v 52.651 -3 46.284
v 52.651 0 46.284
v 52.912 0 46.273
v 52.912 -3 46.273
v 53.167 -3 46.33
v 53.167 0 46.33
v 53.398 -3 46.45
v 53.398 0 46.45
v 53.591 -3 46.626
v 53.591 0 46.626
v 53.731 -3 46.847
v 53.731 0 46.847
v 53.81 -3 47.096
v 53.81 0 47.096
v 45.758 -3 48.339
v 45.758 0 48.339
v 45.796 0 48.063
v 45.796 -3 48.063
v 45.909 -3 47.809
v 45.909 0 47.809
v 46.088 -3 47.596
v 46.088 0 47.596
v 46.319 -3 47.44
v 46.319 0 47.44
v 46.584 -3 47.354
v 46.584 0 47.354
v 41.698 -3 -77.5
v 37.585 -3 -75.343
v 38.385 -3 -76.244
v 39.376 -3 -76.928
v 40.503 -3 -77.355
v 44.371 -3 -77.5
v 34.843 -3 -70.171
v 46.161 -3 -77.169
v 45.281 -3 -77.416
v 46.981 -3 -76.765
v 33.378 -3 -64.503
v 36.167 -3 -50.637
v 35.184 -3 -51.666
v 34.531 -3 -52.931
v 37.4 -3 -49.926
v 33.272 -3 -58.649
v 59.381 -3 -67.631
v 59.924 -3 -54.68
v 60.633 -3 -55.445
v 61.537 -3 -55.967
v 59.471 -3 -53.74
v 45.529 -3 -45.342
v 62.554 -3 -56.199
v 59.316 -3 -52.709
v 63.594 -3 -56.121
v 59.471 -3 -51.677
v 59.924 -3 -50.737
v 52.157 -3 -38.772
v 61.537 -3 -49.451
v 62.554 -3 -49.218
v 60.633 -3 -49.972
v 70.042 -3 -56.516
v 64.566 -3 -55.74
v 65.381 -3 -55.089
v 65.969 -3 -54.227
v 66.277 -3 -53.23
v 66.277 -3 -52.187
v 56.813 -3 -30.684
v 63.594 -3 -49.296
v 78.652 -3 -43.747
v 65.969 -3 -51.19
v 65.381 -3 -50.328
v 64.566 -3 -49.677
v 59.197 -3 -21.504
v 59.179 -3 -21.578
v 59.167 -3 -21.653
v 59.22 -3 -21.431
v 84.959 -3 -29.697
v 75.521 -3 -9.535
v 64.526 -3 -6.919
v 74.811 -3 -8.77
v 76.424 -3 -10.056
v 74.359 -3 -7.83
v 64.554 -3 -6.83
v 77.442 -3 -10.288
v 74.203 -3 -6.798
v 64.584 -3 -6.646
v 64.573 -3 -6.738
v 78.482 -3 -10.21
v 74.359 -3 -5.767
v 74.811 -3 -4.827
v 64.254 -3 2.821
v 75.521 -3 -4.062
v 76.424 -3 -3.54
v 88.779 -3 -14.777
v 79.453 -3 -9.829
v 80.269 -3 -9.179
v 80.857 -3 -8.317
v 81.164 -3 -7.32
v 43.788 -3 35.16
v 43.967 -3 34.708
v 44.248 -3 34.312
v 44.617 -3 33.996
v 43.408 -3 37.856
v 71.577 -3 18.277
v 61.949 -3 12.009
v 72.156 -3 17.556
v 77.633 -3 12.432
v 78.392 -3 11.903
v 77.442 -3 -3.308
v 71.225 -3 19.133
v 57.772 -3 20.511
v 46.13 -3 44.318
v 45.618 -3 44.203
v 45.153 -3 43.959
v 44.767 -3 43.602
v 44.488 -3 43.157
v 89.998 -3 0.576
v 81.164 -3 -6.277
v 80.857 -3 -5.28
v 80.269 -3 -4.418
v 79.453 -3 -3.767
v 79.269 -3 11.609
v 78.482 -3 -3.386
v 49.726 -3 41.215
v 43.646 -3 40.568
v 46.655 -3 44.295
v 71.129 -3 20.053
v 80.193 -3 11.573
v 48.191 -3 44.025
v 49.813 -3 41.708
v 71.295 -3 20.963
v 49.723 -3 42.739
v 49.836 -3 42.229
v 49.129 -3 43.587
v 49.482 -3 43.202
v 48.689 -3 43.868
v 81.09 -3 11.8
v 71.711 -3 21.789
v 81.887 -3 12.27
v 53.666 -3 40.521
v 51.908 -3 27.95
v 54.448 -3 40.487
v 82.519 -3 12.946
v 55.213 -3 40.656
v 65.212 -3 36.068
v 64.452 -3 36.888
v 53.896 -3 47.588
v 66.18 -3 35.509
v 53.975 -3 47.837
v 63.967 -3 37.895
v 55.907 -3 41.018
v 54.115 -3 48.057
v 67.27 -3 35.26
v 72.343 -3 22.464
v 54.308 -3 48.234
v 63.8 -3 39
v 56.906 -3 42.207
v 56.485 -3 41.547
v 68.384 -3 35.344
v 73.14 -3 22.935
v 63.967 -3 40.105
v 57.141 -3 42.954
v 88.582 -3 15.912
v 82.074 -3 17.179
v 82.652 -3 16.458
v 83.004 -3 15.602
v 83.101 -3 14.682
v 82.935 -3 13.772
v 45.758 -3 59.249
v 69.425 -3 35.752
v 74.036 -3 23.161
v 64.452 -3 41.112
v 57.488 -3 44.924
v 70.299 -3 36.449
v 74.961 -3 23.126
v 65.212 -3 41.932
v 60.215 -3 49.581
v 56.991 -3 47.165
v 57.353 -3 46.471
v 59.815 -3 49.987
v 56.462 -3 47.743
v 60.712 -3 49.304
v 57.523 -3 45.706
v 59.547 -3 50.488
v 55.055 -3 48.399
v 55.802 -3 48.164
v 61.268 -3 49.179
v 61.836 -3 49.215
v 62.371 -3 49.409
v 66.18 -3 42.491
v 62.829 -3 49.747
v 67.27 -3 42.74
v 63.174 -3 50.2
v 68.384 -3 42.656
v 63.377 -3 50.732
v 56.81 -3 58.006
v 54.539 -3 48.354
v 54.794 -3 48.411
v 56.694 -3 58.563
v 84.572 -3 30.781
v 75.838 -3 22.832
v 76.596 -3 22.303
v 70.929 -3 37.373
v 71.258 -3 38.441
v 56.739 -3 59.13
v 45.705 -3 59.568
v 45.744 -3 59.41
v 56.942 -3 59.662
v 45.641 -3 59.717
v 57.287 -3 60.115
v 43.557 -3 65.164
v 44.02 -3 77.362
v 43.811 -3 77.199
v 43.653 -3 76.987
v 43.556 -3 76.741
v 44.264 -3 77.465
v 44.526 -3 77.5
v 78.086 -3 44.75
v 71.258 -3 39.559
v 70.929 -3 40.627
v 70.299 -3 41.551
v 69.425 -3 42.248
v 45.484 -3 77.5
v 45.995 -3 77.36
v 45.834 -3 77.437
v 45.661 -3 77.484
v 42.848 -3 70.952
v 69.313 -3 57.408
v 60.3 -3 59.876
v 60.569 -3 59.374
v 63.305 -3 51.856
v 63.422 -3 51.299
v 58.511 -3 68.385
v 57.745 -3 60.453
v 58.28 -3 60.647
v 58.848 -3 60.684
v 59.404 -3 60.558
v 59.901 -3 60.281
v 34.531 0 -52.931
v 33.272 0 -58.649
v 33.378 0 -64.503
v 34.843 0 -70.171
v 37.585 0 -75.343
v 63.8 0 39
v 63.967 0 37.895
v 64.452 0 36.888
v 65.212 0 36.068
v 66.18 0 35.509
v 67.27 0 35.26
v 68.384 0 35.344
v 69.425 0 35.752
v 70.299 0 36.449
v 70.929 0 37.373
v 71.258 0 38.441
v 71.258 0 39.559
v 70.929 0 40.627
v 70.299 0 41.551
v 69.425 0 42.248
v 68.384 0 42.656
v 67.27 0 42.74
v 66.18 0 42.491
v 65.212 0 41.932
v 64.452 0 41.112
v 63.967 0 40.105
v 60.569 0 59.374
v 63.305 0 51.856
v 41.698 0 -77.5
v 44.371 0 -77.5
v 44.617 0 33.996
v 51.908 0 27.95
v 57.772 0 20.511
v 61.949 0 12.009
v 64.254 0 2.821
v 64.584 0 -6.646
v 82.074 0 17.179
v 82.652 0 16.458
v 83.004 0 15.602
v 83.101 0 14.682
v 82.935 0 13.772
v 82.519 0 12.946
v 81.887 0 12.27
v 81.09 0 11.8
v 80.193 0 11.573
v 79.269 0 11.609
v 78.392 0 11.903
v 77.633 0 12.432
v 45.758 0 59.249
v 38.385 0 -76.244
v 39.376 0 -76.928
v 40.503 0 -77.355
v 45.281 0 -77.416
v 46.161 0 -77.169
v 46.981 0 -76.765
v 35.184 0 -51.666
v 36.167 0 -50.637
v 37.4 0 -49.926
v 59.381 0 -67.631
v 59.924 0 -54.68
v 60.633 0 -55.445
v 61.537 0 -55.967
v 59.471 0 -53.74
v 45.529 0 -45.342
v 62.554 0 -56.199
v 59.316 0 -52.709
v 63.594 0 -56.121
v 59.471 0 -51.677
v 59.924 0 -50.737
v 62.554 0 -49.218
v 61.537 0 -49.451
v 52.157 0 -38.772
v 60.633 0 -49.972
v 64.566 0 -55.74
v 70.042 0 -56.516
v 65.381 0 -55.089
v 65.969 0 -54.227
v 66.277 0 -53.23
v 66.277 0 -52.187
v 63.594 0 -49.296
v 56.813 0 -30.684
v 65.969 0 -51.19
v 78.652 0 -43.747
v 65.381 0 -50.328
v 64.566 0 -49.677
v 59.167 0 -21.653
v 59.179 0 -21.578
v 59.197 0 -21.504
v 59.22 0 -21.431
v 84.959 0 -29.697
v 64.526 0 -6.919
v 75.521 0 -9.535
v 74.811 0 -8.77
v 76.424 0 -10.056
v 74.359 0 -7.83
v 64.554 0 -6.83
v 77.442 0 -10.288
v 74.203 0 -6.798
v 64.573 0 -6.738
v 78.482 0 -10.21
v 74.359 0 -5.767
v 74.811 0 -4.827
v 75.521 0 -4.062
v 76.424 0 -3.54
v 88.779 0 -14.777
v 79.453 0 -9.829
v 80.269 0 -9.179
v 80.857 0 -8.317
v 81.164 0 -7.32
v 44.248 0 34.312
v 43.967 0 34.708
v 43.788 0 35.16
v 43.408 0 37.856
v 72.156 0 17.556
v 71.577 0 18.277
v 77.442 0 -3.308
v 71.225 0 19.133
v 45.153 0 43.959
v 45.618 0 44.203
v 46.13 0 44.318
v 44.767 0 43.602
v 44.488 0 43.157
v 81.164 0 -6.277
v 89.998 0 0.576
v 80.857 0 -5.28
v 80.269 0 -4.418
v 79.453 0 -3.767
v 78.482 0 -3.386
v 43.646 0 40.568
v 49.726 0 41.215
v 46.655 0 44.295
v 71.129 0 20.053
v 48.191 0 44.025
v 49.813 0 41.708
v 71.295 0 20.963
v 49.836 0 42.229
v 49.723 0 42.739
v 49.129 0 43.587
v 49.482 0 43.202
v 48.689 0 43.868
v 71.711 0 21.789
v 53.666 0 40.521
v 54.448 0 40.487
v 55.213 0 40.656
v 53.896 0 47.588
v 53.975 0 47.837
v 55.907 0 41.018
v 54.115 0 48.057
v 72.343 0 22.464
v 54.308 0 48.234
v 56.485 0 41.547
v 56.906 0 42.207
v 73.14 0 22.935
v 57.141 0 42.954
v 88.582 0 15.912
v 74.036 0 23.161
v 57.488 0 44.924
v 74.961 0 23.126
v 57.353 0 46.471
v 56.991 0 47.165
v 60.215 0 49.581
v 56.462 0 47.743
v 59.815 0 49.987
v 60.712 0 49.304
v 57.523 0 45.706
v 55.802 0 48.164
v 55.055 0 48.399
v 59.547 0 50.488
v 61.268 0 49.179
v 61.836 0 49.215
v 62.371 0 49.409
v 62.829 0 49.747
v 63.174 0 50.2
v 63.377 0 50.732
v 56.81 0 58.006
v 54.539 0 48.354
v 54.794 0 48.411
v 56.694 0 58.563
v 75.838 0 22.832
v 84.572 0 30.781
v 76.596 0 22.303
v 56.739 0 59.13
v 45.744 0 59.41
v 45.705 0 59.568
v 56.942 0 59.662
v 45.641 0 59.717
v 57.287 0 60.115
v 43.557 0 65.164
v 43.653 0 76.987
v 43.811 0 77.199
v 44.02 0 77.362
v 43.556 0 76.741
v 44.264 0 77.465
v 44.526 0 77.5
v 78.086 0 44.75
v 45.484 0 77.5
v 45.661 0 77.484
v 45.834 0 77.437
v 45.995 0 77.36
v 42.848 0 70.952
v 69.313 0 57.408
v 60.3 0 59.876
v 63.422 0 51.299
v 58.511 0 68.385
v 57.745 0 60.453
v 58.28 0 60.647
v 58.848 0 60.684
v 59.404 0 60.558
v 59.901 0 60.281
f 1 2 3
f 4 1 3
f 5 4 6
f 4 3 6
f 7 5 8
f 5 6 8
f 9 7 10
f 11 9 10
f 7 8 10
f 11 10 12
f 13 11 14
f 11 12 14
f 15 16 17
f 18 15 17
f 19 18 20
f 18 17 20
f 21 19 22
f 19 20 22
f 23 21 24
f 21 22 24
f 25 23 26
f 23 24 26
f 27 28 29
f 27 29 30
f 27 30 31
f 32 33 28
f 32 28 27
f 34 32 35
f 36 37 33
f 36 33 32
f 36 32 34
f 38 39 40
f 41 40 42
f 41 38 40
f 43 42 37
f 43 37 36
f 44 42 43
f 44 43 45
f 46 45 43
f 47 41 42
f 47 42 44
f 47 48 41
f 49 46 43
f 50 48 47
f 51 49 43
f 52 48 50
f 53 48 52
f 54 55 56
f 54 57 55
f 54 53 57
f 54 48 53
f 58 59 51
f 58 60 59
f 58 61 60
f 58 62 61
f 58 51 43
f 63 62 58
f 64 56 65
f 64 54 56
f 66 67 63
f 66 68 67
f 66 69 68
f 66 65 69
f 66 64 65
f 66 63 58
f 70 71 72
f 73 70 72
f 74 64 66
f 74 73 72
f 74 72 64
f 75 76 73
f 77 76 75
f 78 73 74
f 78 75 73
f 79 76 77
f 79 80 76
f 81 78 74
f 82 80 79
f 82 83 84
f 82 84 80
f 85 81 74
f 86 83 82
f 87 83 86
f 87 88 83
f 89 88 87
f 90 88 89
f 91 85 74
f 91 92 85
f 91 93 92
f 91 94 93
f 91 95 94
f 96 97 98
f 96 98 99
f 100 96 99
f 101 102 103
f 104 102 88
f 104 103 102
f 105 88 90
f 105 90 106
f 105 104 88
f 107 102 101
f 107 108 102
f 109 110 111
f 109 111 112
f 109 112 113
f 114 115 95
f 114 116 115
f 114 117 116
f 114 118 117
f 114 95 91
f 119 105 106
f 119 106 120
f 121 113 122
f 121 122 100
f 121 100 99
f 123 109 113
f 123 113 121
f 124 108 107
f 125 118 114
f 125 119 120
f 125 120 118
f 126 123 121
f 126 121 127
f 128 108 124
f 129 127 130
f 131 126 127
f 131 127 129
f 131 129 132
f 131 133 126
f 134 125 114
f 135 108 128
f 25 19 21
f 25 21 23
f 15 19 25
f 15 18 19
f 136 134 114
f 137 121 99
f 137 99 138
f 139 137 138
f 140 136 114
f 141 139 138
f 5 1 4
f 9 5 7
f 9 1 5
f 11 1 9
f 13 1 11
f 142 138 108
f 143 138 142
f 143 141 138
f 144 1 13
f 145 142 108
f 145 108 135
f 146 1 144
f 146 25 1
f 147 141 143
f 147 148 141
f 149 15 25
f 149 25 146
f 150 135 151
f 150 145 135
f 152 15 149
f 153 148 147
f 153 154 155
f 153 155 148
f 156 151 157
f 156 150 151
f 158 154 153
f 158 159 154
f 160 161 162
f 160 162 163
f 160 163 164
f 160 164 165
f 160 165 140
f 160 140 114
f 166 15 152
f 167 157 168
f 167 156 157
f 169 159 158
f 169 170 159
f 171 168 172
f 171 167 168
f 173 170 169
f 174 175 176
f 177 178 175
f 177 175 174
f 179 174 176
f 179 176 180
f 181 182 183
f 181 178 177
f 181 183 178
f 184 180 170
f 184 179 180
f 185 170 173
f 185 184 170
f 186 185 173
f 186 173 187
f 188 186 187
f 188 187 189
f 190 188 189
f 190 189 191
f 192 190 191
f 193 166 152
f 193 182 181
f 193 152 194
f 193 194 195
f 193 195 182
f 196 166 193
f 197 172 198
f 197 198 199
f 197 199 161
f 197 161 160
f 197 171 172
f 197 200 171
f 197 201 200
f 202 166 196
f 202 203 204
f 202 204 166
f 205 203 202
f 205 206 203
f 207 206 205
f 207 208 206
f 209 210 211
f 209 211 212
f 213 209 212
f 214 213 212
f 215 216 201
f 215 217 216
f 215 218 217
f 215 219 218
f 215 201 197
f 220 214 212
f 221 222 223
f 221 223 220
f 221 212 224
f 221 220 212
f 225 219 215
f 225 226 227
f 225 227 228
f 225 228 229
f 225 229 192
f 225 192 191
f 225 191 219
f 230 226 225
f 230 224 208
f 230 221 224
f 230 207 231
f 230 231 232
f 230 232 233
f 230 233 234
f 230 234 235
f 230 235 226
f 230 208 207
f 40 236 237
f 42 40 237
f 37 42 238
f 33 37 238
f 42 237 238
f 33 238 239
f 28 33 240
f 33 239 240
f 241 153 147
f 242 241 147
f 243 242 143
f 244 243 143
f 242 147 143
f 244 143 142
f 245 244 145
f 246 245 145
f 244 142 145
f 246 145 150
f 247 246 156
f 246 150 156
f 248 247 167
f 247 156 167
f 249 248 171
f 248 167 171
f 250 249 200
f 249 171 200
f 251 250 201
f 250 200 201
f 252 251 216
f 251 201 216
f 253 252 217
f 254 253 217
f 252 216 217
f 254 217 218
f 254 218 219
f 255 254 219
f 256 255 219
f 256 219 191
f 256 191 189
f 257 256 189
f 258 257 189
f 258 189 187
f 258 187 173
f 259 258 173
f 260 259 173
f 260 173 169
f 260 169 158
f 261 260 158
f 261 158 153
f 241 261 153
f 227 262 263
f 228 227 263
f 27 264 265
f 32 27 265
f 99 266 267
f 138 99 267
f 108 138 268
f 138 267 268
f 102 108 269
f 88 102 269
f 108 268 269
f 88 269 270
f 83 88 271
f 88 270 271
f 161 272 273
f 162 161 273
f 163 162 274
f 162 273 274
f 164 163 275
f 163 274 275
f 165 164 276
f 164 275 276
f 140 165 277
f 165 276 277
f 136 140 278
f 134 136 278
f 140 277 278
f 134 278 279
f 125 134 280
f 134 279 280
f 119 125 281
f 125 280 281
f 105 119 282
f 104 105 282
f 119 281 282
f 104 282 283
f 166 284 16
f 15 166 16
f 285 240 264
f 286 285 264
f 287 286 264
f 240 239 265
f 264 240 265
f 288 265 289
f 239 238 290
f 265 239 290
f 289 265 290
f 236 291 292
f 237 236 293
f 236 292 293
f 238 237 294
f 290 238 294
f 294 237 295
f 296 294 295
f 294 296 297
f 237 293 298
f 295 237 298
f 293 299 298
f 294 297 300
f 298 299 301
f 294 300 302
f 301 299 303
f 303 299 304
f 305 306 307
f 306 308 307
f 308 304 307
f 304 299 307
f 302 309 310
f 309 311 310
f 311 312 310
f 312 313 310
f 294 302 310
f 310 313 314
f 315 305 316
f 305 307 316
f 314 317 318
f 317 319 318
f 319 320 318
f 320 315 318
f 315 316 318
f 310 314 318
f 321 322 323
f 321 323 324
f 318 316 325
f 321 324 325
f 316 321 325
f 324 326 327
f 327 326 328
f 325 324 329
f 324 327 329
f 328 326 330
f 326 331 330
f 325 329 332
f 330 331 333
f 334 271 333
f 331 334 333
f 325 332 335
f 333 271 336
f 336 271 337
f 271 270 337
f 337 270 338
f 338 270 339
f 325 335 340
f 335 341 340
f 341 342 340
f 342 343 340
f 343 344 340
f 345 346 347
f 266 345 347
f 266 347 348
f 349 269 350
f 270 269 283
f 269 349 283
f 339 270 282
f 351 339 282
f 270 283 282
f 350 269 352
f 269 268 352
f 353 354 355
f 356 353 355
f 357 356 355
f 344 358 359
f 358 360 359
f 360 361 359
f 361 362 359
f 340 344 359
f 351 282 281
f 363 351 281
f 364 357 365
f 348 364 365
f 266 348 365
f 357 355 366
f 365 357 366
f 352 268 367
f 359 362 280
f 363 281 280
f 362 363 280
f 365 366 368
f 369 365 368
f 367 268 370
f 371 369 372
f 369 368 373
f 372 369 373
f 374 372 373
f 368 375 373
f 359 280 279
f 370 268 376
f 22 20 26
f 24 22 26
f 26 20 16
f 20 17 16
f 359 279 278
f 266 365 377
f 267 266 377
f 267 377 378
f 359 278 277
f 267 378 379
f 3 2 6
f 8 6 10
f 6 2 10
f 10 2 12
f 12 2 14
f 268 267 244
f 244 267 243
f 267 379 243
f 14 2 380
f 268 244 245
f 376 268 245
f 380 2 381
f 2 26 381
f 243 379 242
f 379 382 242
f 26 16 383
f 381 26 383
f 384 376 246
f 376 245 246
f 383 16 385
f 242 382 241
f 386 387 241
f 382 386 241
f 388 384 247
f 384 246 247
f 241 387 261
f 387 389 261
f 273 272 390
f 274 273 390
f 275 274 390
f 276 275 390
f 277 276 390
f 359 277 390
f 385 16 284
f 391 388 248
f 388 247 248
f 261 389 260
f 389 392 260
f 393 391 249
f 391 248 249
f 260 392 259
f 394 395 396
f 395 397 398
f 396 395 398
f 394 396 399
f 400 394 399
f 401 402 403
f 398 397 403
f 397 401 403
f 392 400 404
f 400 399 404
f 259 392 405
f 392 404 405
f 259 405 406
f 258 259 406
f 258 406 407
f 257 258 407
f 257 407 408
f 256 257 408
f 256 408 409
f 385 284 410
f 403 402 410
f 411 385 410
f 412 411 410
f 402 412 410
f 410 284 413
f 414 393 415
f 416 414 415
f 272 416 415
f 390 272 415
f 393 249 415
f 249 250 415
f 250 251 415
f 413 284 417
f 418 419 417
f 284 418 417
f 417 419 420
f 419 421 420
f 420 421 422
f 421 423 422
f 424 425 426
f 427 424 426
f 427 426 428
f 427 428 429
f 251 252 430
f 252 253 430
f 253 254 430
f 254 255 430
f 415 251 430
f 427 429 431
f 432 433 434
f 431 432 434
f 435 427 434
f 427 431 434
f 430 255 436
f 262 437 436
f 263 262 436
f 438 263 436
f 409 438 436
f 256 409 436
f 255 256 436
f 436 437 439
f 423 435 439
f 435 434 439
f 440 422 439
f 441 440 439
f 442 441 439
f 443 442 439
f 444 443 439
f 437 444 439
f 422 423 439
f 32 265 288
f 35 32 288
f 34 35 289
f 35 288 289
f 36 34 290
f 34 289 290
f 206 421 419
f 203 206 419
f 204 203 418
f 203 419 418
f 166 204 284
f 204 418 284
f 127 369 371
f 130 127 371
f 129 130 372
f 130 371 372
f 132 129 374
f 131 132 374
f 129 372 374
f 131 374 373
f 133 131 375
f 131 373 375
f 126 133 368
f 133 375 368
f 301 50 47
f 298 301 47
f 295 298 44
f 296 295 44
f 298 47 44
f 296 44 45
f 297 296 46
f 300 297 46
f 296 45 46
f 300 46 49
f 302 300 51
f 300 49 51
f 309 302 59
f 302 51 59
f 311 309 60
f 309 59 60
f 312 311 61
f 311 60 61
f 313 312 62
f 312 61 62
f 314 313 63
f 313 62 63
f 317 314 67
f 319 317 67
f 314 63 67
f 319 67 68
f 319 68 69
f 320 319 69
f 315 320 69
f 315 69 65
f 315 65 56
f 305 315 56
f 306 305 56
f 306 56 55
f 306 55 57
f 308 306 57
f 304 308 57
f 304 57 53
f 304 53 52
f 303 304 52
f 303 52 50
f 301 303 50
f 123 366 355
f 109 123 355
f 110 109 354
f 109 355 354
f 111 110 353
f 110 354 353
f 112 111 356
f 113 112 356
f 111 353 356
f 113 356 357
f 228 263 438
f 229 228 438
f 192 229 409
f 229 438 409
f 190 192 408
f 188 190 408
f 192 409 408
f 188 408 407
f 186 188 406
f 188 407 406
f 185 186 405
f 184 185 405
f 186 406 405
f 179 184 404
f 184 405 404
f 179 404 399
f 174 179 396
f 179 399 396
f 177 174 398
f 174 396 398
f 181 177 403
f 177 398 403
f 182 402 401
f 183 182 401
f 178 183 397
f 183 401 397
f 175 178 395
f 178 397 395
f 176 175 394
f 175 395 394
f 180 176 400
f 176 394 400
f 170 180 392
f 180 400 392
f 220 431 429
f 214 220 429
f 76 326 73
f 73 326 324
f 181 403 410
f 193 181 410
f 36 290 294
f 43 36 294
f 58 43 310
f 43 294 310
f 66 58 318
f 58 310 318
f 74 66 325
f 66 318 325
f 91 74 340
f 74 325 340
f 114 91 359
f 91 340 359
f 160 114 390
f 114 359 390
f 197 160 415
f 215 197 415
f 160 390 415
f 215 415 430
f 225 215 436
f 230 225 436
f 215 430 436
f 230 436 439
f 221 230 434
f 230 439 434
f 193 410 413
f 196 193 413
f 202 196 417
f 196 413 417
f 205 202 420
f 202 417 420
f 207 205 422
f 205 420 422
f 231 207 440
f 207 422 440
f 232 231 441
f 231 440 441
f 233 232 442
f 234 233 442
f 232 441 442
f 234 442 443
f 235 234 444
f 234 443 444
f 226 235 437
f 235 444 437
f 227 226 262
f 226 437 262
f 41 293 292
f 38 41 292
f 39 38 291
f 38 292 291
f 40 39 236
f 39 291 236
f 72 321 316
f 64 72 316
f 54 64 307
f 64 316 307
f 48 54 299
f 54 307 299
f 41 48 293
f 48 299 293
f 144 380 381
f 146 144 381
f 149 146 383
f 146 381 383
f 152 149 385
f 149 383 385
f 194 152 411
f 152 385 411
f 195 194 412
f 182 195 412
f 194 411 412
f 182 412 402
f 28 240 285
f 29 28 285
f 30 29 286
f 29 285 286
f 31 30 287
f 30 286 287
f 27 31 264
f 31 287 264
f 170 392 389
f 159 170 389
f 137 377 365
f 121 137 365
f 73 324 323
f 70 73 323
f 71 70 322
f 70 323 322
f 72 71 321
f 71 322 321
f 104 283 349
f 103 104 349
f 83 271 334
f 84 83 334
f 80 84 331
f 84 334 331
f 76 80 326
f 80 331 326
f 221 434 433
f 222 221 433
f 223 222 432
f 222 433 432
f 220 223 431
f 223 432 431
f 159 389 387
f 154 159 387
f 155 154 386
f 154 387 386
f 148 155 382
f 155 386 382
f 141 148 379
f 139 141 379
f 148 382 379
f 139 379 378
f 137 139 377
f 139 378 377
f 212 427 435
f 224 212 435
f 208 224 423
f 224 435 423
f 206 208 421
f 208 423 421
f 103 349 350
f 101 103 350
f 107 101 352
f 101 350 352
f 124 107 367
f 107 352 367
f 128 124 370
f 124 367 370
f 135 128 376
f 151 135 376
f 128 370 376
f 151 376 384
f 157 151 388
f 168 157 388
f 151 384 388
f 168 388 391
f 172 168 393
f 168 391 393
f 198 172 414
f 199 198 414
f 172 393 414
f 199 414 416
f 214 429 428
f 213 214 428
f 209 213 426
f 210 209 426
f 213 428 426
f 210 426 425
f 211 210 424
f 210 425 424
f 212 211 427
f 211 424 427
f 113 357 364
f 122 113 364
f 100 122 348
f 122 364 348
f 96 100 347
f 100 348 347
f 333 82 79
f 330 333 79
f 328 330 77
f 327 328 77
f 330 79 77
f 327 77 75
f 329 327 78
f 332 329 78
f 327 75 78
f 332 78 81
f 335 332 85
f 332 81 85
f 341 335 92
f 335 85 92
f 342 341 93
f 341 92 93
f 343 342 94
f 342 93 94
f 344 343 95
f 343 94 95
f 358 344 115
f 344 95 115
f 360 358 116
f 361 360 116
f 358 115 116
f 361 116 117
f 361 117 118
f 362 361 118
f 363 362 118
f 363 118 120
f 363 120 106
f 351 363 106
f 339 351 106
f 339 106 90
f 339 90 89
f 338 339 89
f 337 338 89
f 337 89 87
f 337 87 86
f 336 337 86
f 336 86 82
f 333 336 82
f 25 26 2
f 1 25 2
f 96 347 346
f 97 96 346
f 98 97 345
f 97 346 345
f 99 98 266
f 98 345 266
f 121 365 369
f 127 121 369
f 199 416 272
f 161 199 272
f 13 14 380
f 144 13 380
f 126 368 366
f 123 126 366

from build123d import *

# Parameters (mm, degrees)
F1_DEPTH = 3
F2_D     = 7.5
F3_D     = 7


with BuildPart() as f1:
    # F0 (on Front) → F1 (new body)
    with BuildSketch(Plane.XZ):
        with BuildLine():
            ThreePointArc((44.3705983732, -77.5), (45.7264137346, -77.3126671094), (46.9806335717, -76.7647058824))
            ThreePointArc((46.9806335717, -76.7647058824), (89.9981580742, 0.57579792), (45.9945642101, 77.3595505618))
            ThreePointArc((45.9945642101, 77.3595505618), (45.7485129667, 77.4642485576), (45.4835134967, 77.5))
            Line((45.4835134967, 77.5), (44.5262354224, 77.5))
            ThreePointArc((44.5262354224, 77.5), (43.9102444687, 77.2877532259), (43.5557377006, 76.74111029))
            ThreePointArc((43.5557377006, 76.74111029), (43.0257432914, 68.0363839372), (45.6411198435, 59.7169512378))
            ThreePointArc((45.6411198435, 59.7169512378), (45.7279786025, 59.4899612828), (45.7575130443, 59.2487215672))
            Line((45.7575130443, 59.2487215672), (45.7575130443, 48.3390996312))
            ThreePointArc((45.7575130443, 48.3390996312), (45.9914686012, 47.6963120215), (46.5838648666, 47.3542918782))
            Line((46.5838648666, 47.3542918782), (52.6511673154, 46.2844627563))
            ThreePointArc((52.6511673154, 46.2844627563), (53.3983919294, 46.4501184651), (53.8096232461, 47.0956223317))
            Line((53.8096232461, 47.0956223317), (53.8964473349, 47.5880262082))
            ThreePointArc((53.8964473349, 47.5880262082), (54.3076786516, 48.2335300748), (55.0549032656, 48.3991857835))
            ThreePointArc((55.0549032656, 48.3991857835), (56.9914148655, 47.1654918335), (57.4883819916, 44.9238179915))
            Line((57.4883819916, 44.9238179915), (57.1410856363, 42.9542024855))
            ThreePointArc((57.1410856363, 42.9542024855), (55.9073916863, 41.0176908856), (53.6657178442, 40.5207237594))
            Line((53.6657178442, 40.5207237594), (49.7264868322, 41.2153164701))
            Line((49.7264868322, 41.2153164701), (49.813310921, 41.7077203466))
            ThreePointArc((49.813310921, 41.7077203466), (49.4819995036, 43.2021695746), (48.1909917703, 44.024632208))
            Line((48.1909917703, 44.024632208), (46.654928091, 44.2954816787))
            ThreePointArc((46.654928091, 44.2954816787), (45.3770547888, 44.0961843774), (44.4883207532, 43.1565932934))
            ThreePointArc((44.4883207532, 43.1565932934), (43.4498768152, 39.2184028407), (43.7884788704, 35.1597012623))
            ThreePointArc((43.7884788704, 35.1597012623), (44.0953044742, 34.5016388527), (44.6168439919, 33.9964808404))
            ThreePointArc((44.6168439919, 33.9964808404), (60.0850196139, 16.3699097283), (64.5841686774, -6.6456963673))
            ThreePointArc((64.5841686774, -6.6456963673), (64.5645764936, -6.784174398), (64.5258561915, -6.9185647133))
            Line((64.5258561915, -6.9185647133), (59.2200951601, -21.4309391015))
            ThreePointArc((59.2200951601, -21.4309391015), (59.1869810524, -21.540630442), (59.1666321841, -21.6533897337))
            ThreePointArc((59.1666321841, -21.6533897337), (52.1569189093, -38.7718630086), (37.4004437105, -49.9264426586))
            ThreePointArc((37.4004437105, -49.9264426586), (35.6386283719, -51.1165251582), (34.530567944, -52.9310476109))
            ThreePointArc((34.530567944, -52.9310476109), (33.3782658922, -64.5025194612), (37.5854765853, -75.34346679))
            ThreePointArc((37.5854765853, -75.34346679), (39.3763002237, -76.9281674511), (41.6982246465, -77.5))
            Line((41.6982246465, -77.5), (44.3705983732, -77.5))
        make_face()
        with BuildLine():
            ThreePointArc((56.8104775969, 58.0058225518), (58.0058225518, 60.5692480801), (60.5692480801, 59.3739031251))
            Line((60.5692480801, 59.3739031251), (63.3054092267, 51.8563621588))
            ThreePointArc((63.3054092267, 51.8563621588), (62.1100642717, 49.2929366306), (59.5466387435, 50.4882815855))
            Line((59.5466387435, 50.4882815855), (56.8104775969, 58.0058225518))
        make_face(mode=Mode.SUBTRACT)
        with BuildLine():
            ThreePointArc((72.1561451286, 17.555574771), (72.0027969224, 22.1492099685), (76.5964321199, 22.3025581748))
            Line((76.5964321199, 22.3025581748), (82.0737206627, 17.1791501079))
            ThreePointArc((82.0737206627, 17.1791501079), (82.2270688689, 12.5855149104), (77.6334336714, 12.4321667042))
            Line((77.6334336714, 12.4321667042), (72.1561451286, 17.555574771))
        make_face(mode=Mode.SUBTRACT)
    extrude(amount=F1_DEPTH)

    # F2 (through all)
    with Locations(Plane(origin=(0, 0, 0), x_dir=(1, 0, 0), z_dir=(0, 1, 0))):
        with Locations((67.5499814952, -39)):
            Hole(F2_D / 2)

    # F3 (through all)
    with Locations(Plane(origin=(0, 0, 0), x_dir=(1, 0, 0), z_dir=(0, 1, 0))):
        with Locations((77.7031864512, 6.7981479343), (62.8156443358, 52.7085839943)):
            Hole(F3_D / 2)


solid = f1.part
